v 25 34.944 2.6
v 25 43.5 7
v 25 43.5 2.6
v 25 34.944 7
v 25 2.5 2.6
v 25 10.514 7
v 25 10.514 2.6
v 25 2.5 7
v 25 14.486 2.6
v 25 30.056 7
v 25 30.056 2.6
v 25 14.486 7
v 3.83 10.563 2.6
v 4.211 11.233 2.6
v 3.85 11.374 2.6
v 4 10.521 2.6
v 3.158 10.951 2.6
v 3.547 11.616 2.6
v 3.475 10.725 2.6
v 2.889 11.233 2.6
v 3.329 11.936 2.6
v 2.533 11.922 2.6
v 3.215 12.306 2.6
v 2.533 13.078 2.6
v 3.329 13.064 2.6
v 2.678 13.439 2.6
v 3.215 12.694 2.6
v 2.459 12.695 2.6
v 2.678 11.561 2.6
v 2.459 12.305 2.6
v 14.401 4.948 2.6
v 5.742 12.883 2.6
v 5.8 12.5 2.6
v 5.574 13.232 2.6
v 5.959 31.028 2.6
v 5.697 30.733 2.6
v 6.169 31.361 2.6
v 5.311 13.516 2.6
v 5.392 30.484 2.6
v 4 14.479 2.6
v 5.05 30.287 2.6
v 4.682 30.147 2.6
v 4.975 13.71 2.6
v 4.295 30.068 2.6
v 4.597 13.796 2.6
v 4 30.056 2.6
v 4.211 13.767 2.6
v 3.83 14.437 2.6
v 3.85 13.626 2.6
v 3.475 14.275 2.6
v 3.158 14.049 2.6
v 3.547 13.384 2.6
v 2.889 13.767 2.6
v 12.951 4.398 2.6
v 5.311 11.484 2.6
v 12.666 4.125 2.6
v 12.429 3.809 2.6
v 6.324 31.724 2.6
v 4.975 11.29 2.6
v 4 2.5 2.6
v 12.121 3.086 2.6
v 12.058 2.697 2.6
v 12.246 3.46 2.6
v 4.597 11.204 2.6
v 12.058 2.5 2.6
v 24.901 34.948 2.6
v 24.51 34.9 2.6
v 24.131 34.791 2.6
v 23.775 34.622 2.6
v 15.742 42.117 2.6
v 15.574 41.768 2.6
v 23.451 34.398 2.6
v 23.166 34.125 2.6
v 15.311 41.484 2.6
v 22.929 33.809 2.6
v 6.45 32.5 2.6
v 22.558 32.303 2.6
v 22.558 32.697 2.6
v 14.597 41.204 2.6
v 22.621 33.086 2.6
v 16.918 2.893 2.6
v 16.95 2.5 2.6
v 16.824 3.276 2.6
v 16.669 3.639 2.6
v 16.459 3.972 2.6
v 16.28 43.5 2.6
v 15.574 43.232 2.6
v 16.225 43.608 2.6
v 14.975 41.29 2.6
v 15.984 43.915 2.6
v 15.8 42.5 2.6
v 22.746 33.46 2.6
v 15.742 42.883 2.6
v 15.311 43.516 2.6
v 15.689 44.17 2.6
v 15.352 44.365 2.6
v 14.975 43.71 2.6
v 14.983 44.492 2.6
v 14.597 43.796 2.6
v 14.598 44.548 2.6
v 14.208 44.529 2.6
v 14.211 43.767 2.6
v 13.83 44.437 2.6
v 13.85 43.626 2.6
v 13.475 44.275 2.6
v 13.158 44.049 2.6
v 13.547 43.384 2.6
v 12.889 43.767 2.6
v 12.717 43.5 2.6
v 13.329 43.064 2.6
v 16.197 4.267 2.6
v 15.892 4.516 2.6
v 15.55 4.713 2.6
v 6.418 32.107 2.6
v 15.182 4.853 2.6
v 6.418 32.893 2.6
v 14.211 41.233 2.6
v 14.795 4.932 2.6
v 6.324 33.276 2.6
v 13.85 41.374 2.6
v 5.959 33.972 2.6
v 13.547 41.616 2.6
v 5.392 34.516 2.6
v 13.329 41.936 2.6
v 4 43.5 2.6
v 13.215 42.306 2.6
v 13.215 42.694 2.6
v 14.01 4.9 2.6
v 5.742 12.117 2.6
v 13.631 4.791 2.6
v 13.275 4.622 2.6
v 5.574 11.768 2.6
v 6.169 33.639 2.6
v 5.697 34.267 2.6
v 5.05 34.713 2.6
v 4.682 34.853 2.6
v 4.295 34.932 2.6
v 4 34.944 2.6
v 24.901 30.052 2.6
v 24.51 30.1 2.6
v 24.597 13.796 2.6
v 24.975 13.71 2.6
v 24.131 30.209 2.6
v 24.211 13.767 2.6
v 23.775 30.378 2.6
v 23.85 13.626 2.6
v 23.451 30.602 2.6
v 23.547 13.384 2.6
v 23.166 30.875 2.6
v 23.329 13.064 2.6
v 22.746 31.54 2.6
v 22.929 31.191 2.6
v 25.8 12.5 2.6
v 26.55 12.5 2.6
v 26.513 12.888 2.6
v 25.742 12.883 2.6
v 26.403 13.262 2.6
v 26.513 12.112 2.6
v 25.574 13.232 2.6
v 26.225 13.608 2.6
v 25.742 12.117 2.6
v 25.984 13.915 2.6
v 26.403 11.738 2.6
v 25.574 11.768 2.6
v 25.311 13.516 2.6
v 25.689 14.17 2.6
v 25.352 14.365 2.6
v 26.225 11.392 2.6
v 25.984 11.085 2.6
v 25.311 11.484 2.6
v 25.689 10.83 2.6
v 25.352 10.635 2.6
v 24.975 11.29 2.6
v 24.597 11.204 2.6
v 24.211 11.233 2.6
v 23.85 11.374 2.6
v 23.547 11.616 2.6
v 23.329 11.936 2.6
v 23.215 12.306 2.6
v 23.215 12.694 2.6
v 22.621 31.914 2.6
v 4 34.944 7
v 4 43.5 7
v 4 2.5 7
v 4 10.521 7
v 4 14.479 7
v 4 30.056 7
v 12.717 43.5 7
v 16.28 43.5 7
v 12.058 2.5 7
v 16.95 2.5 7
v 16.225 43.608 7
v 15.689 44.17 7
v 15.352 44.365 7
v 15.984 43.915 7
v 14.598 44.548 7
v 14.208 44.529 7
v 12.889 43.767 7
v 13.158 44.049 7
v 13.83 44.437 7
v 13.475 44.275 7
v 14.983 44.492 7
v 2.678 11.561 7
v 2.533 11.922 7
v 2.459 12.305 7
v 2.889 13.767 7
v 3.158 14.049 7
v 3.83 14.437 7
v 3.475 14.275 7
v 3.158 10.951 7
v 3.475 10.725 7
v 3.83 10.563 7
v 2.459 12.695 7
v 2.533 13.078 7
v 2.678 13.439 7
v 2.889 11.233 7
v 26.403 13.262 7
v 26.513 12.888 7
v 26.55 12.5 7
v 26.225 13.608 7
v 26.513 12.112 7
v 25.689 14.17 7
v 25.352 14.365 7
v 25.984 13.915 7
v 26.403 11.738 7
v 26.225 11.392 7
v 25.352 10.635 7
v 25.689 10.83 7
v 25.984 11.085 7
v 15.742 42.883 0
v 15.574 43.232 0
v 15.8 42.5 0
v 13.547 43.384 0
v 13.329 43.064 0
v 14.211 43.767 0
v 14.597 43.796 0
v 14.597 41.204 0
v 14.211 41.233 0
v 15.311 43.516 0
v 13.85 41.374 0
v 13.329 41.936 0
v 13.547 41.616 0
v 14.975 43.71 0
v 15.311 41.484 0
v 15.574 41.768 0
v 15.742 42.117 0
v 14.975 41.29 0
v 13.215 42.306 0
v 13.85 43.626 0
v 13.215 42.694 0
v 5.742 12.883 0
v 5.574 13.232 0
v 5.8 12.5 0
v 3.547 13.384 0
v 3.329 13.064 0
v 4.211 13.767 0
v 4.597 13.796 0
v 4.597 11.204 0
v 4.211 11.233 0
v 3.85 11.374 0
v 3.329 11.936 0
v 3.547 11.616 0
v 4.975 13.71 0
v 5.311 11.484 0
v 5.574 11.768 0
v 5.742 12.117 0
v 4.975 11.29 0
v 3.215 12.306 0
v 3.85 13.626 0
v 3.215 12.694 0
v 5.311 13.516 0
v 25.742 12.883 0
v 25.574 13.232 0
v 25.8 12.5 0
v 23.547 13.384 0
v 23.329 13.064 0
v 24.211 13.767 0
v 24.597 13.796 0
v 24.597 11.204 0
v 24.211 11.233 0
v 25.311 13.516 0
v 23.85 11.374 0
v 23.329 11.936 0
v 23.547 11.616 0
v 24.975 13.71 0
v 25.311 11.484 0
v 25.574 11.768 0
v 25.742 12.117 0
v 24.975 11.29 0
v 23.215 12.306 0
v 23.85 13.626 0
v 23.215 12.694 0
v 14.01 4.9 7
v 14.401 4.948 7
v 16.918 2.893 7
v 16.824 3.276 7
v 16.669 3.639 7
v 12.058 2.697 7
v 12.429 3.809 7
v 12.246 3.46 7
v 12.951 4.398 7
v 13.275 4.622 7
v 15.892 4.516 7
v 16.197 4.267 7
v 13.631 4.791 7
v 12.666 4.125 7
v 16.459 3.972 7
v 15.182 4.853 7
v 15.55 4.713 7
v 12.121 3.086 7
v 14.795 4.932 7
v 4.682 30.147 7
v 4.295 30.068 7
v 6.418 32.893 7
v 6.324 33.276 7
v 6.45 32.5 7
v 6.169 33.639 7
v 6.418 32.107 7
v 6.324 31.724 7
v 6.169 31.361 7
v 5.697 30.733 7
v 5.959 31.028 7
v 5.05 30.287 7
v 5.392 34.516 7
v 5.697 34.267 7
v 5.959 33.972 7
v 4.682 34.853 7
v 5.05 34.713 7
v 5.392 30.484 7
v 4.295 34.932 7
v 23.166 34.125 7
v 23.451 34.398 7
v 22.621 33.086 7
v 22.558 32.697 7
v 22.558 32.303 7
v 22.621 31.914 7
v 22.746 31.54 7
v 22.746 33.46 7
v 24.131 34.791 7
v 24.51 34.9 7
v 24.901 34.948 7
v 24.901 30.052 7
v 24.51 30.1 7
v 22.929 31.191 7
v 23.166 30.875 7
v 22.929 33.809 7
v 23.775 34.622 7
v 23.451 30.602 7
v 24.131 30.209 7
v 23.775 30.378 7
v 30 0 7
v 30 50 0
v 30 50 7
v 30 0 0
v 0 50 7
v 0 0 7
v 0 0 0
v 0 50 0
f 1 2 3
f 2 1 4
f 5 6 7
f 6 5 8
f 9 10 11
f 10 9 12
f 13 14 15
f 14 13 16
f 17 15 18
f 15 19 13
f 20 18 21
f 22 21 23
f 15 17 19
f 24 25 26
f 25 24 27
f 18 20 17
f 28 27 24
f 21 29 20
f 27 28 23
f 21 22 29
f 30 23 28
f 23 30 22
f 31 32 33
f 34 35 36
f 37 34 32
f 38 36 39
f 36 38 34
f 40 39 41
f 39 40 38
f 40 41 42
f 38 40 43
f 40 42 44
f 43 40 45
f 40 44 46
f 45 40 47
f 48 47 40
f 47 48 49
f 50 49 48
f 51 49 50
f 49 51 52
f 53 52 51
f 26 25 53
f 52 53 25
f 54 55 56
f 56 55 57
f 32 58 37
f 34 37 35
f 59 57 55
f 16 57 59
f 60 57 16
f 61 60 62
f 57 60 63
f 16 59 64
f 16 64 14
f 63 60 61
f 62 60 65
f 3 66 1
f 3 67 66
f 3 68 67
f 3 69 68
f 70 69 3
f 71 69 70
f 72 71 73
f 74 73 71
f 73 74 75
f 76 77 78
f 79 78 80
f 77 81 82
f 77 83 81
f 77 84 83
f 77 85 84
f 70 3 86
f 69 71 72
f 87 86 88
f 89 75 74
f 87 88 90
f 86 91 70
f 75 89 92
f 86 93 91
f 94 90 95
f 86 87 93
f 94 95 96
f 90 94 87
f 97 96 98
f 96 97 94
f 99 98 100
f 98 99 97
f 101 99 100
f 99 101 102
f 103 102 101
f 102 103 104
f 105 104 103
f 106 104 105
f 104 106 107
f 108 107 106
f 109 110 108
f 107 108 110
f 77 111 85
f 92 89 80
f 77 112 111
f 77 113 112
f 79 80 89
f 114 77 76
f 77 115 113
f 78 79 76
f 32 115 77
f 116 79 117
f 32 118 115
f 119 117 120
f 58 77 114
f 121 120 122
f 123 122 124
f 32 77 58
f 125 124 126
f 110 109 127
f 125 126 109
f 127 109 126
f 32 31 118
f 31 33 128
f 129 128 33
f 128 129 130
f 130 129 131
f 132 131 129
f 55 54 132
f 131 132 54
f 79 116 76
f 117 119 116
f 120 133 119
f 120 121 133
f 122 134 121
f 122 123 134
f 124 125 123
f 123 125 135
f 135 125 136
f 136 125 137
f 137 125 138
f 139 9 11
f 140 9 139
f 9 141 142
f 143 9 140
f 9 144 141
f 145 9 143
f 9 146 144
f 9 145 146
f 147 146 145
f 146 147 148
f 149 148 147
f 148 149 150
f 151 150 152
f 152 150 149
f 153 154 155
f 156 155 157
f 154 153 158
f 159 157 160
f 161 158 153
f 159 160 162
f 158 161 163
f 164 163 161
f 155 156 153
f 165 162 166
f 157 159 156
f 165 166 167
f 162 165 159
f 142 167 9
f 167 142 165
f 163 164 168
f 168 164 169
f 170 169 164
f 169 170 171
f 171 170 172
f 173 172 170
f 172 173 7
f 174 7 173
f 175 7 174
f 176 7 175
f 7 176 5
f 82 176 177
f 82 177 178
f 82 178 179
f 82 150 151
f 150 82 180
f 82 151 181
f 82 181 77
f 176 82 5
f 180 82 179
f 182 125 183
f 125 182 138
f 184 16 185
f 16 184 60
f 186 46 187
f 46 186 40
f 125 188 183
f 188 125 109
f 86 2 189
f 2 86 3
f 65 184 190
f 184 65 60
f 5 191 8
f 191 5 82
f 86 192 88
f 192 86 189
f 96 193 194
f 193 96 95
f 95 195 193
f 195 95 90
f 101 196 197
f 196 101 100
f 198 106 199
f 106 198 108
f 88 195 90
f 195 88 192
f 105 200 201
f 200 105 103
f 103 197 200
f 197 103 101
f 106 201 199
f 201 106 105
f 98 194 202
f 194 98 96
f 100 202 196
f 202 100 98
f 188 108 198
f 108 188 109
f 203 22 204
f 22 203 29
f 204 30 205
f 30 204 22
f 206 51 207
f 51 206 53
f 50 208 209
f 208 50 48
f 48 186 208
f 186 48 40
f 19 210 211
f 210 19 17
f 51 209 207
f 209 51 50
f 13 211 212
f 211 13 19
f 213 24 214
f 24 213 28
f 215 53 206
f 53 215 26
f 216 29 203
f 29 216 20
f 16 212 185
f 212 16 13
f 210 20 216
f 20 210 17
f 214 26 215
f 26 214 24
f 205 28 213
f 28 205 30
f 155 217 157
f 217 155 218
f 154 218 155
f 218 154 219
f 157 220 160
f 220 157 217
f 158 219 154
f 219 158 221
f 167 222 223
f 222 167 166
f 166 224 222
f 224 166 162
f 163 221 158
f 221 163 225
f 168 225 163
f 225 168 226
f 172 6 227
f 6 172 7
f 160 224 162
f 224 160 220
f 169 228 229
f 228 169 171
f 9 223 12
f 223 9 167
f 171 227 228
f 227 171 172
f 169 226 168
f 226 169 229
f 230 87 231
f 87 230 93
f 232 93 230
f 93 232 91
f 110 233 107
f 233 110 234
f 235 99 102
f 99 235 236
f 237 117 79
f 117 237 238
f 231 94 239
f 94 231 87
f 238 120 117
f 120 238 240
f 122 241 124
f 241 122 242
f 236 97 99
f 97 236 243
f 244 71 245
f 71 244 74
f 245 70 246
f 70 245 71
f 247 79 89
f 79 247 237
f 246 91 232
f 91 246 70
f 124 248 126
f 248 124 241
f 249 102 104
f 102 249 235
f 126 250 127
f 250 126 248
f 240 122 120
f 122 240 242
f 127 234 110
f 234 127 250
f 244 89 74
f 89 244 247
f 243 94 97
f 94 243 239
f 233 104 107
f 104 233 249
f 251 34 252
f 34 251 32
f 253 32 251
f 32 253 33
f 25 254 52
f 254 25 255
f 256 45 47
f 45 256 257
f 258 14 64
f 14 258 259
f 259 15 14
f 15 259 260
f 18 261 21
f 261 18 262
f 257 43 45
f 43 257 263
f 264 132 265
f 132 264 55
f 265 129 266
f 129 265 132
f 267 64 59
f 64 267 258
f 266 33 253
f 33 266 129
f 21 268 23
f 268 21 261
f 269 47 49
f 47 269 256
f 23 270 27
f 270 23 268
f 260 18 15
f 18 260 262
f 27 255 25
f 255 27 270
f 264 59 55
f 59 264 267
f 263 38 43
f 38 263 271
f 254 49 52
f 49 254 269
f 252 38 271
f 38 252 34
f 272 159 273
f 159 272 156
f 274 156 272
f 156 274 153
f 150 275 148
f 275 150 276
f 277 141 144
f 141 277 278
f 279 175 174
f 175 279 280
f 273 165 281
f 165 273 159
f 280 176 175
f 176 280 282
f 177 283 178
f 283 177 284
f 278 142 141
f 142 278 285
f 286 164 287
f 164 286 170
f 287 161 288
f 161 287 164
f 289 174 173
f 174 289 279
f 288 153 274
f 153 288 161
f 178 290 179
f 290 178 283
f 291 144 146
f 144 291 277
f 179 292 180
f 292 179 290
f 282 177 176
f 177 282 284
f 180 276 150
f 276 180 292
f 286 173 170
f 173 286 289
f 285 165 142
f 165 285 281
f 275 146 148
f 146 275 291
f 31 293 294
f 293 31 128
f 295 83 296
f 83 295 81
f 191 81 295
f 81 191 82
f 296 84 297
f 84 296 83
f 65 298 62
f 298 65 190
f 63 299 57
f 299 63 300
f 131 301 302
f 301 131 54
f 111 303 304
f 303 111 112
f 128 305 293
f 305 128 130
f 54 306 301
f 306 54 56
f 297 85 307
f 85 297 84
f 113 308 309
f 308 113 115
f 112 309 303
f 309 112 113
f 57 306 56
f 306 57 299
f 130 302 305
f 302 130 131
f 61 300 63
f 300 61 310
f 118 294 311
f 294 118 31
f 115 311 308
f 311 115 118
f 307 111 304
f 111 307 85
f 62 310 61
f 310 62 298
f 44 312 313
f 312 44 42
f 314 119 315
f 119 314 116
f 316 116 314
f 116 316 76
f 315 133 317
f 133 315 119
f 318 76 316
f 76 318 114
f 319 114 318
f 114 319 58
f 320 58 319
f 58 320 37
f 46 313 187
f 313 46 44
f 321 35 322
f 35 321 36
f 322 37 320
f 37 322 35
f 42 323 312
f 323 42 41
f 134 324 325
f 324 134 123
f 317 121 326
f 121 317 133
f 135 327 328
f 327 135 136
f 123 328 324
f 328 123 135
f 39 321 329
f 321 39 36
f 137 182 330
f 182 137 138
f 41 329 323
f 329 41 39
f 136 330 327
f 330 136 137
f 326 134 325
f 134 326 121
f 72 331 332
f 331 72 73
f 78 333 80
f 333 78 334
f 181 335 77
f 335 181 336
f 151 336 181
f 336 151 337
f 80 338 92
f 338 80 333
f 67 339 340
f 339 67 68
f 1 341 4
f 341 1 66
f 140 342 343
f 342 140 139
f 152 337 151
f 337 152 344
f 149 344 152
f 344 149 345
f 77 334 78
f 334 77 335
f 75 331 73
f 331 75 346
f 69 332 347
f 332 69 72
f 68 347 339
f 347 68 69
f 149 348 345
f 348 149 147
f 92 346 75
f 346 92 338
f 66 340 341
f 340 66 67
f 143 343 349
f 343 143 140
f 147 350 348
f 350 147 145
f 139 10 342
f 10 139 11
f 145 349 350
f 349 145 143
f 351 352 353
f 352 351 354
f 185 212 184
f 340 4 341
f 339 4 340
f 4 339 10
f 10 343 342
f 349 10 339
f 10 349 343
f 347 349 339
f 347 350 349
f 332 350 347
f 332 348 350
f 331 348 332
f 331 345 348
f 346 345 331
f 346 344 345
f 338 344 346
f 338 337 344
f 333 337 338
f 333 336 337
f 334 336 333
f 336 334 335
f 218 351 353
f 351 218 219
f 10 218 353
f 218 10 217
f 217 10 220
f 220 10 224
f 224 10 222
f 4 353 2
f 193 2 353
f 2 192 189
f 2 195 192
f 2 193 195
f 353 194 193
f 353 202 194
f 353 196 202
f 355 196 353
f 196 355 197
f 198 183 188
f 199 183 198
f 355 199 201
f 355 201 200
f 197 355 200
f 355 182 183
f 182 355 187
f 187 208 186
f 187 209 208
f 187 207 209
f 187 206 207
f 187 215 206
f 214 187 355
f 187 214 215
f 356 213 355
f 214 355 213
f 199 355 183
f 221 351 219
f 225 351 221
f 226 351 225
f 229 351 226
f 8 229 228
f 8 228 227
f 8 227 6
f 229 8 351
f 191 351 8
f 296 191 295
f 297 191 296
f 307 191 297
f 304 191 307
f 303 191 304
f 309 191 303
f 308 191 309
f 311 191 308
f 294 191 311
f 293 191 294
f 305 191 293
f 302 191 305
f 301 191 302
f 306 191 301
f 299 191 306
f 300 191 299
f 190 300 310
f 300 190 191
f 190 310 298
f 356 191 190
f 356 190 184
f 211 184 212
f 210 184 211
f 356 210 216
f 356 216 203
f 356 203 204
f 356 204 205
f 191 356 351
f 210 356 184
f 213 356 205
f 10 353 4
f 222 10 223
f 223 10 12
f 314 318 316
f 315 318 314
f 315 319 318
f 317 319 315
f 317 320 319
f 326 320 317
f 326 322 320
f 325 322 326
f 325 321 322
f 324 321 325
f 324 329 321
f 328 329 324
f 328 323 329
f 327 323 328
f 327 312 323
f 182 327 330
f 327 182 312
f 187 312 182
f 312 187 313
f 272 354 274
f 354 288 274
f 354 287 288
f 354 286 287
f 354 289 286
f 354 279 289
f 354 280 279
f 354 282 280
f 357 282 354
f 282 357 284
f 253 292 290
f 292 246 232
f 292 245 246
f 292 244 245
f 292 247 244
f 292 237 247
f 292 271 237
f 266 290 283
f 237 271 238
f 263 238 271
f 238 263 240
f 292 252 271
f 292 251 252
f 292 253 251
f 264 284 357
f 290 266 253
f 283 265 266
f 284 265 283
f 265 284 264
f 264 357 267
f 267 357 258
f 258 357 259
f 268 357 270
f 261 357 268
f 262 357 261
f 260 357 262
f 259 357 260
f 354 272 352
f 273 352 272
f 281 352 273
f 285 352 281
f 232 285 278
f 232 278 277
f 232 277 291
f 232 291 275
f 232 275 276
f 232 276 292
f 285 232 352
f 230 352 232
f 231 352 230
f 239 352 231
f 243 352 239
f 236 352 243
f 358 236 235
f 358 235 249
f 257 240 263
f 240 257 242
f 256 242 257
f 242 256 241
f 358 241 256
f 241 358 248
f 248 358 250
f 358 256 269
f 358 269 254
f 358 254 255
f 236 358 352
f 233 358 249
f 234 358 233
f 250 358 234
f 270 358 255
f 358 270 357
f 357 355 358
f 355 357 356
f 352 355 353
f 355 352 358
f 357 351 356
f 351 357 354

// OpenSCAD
// file: grove_sensor.scad
module grove_sensor_plate(thickness = 0, screws_lenght = 0) {
    difference() {
        union() {
            cube([21, 41, 1.5 + thickness]);

            translate([10.5, 40, 0])
                cylinder(r=2.05, h=1.5 + thickness);

            translate([0.5, 10, 0])
                cylinder(r=2.05, h=1.5 + thickness);

            translate([20.5, 10, 0])
                cylinder(r=2.05, h=1.5 + thickness);

            translate([10.5, 40, -0.2 - screws_lenght])
                cylinder(r=1.30, h=3 + thickness + screws_lenght);

            translate([0.5, 10, -0.2 - screws_lenght])
                cylinder(r=1.30, h=3 + thickness + screws_lenght);

            translate([20.5, 10, -0.2 - screws_lenght])
                cylinder(r=1.30, h=3 + thickness + screws_lenght);
        }
        
        translate([10.5, 0, -0.1])
            cylinder(r=2.45, h=3 + thickness);
        
        translate([0, 30, -0.1])
            cylinder(r=2.45, h=3 + thickness);

        translate([21, 30, -0.1])
            cylinder(r=2.45, h=3 + thickness);

       
    }
}
// main file
include <grove_sensor.scad>

$fa = 1;
$fs = 0.4;

difference() {
    cube([30, 50, 7]);

    translate([4, 2.5, 2.6])
        grove_sensor_plate(10, 3);
}
